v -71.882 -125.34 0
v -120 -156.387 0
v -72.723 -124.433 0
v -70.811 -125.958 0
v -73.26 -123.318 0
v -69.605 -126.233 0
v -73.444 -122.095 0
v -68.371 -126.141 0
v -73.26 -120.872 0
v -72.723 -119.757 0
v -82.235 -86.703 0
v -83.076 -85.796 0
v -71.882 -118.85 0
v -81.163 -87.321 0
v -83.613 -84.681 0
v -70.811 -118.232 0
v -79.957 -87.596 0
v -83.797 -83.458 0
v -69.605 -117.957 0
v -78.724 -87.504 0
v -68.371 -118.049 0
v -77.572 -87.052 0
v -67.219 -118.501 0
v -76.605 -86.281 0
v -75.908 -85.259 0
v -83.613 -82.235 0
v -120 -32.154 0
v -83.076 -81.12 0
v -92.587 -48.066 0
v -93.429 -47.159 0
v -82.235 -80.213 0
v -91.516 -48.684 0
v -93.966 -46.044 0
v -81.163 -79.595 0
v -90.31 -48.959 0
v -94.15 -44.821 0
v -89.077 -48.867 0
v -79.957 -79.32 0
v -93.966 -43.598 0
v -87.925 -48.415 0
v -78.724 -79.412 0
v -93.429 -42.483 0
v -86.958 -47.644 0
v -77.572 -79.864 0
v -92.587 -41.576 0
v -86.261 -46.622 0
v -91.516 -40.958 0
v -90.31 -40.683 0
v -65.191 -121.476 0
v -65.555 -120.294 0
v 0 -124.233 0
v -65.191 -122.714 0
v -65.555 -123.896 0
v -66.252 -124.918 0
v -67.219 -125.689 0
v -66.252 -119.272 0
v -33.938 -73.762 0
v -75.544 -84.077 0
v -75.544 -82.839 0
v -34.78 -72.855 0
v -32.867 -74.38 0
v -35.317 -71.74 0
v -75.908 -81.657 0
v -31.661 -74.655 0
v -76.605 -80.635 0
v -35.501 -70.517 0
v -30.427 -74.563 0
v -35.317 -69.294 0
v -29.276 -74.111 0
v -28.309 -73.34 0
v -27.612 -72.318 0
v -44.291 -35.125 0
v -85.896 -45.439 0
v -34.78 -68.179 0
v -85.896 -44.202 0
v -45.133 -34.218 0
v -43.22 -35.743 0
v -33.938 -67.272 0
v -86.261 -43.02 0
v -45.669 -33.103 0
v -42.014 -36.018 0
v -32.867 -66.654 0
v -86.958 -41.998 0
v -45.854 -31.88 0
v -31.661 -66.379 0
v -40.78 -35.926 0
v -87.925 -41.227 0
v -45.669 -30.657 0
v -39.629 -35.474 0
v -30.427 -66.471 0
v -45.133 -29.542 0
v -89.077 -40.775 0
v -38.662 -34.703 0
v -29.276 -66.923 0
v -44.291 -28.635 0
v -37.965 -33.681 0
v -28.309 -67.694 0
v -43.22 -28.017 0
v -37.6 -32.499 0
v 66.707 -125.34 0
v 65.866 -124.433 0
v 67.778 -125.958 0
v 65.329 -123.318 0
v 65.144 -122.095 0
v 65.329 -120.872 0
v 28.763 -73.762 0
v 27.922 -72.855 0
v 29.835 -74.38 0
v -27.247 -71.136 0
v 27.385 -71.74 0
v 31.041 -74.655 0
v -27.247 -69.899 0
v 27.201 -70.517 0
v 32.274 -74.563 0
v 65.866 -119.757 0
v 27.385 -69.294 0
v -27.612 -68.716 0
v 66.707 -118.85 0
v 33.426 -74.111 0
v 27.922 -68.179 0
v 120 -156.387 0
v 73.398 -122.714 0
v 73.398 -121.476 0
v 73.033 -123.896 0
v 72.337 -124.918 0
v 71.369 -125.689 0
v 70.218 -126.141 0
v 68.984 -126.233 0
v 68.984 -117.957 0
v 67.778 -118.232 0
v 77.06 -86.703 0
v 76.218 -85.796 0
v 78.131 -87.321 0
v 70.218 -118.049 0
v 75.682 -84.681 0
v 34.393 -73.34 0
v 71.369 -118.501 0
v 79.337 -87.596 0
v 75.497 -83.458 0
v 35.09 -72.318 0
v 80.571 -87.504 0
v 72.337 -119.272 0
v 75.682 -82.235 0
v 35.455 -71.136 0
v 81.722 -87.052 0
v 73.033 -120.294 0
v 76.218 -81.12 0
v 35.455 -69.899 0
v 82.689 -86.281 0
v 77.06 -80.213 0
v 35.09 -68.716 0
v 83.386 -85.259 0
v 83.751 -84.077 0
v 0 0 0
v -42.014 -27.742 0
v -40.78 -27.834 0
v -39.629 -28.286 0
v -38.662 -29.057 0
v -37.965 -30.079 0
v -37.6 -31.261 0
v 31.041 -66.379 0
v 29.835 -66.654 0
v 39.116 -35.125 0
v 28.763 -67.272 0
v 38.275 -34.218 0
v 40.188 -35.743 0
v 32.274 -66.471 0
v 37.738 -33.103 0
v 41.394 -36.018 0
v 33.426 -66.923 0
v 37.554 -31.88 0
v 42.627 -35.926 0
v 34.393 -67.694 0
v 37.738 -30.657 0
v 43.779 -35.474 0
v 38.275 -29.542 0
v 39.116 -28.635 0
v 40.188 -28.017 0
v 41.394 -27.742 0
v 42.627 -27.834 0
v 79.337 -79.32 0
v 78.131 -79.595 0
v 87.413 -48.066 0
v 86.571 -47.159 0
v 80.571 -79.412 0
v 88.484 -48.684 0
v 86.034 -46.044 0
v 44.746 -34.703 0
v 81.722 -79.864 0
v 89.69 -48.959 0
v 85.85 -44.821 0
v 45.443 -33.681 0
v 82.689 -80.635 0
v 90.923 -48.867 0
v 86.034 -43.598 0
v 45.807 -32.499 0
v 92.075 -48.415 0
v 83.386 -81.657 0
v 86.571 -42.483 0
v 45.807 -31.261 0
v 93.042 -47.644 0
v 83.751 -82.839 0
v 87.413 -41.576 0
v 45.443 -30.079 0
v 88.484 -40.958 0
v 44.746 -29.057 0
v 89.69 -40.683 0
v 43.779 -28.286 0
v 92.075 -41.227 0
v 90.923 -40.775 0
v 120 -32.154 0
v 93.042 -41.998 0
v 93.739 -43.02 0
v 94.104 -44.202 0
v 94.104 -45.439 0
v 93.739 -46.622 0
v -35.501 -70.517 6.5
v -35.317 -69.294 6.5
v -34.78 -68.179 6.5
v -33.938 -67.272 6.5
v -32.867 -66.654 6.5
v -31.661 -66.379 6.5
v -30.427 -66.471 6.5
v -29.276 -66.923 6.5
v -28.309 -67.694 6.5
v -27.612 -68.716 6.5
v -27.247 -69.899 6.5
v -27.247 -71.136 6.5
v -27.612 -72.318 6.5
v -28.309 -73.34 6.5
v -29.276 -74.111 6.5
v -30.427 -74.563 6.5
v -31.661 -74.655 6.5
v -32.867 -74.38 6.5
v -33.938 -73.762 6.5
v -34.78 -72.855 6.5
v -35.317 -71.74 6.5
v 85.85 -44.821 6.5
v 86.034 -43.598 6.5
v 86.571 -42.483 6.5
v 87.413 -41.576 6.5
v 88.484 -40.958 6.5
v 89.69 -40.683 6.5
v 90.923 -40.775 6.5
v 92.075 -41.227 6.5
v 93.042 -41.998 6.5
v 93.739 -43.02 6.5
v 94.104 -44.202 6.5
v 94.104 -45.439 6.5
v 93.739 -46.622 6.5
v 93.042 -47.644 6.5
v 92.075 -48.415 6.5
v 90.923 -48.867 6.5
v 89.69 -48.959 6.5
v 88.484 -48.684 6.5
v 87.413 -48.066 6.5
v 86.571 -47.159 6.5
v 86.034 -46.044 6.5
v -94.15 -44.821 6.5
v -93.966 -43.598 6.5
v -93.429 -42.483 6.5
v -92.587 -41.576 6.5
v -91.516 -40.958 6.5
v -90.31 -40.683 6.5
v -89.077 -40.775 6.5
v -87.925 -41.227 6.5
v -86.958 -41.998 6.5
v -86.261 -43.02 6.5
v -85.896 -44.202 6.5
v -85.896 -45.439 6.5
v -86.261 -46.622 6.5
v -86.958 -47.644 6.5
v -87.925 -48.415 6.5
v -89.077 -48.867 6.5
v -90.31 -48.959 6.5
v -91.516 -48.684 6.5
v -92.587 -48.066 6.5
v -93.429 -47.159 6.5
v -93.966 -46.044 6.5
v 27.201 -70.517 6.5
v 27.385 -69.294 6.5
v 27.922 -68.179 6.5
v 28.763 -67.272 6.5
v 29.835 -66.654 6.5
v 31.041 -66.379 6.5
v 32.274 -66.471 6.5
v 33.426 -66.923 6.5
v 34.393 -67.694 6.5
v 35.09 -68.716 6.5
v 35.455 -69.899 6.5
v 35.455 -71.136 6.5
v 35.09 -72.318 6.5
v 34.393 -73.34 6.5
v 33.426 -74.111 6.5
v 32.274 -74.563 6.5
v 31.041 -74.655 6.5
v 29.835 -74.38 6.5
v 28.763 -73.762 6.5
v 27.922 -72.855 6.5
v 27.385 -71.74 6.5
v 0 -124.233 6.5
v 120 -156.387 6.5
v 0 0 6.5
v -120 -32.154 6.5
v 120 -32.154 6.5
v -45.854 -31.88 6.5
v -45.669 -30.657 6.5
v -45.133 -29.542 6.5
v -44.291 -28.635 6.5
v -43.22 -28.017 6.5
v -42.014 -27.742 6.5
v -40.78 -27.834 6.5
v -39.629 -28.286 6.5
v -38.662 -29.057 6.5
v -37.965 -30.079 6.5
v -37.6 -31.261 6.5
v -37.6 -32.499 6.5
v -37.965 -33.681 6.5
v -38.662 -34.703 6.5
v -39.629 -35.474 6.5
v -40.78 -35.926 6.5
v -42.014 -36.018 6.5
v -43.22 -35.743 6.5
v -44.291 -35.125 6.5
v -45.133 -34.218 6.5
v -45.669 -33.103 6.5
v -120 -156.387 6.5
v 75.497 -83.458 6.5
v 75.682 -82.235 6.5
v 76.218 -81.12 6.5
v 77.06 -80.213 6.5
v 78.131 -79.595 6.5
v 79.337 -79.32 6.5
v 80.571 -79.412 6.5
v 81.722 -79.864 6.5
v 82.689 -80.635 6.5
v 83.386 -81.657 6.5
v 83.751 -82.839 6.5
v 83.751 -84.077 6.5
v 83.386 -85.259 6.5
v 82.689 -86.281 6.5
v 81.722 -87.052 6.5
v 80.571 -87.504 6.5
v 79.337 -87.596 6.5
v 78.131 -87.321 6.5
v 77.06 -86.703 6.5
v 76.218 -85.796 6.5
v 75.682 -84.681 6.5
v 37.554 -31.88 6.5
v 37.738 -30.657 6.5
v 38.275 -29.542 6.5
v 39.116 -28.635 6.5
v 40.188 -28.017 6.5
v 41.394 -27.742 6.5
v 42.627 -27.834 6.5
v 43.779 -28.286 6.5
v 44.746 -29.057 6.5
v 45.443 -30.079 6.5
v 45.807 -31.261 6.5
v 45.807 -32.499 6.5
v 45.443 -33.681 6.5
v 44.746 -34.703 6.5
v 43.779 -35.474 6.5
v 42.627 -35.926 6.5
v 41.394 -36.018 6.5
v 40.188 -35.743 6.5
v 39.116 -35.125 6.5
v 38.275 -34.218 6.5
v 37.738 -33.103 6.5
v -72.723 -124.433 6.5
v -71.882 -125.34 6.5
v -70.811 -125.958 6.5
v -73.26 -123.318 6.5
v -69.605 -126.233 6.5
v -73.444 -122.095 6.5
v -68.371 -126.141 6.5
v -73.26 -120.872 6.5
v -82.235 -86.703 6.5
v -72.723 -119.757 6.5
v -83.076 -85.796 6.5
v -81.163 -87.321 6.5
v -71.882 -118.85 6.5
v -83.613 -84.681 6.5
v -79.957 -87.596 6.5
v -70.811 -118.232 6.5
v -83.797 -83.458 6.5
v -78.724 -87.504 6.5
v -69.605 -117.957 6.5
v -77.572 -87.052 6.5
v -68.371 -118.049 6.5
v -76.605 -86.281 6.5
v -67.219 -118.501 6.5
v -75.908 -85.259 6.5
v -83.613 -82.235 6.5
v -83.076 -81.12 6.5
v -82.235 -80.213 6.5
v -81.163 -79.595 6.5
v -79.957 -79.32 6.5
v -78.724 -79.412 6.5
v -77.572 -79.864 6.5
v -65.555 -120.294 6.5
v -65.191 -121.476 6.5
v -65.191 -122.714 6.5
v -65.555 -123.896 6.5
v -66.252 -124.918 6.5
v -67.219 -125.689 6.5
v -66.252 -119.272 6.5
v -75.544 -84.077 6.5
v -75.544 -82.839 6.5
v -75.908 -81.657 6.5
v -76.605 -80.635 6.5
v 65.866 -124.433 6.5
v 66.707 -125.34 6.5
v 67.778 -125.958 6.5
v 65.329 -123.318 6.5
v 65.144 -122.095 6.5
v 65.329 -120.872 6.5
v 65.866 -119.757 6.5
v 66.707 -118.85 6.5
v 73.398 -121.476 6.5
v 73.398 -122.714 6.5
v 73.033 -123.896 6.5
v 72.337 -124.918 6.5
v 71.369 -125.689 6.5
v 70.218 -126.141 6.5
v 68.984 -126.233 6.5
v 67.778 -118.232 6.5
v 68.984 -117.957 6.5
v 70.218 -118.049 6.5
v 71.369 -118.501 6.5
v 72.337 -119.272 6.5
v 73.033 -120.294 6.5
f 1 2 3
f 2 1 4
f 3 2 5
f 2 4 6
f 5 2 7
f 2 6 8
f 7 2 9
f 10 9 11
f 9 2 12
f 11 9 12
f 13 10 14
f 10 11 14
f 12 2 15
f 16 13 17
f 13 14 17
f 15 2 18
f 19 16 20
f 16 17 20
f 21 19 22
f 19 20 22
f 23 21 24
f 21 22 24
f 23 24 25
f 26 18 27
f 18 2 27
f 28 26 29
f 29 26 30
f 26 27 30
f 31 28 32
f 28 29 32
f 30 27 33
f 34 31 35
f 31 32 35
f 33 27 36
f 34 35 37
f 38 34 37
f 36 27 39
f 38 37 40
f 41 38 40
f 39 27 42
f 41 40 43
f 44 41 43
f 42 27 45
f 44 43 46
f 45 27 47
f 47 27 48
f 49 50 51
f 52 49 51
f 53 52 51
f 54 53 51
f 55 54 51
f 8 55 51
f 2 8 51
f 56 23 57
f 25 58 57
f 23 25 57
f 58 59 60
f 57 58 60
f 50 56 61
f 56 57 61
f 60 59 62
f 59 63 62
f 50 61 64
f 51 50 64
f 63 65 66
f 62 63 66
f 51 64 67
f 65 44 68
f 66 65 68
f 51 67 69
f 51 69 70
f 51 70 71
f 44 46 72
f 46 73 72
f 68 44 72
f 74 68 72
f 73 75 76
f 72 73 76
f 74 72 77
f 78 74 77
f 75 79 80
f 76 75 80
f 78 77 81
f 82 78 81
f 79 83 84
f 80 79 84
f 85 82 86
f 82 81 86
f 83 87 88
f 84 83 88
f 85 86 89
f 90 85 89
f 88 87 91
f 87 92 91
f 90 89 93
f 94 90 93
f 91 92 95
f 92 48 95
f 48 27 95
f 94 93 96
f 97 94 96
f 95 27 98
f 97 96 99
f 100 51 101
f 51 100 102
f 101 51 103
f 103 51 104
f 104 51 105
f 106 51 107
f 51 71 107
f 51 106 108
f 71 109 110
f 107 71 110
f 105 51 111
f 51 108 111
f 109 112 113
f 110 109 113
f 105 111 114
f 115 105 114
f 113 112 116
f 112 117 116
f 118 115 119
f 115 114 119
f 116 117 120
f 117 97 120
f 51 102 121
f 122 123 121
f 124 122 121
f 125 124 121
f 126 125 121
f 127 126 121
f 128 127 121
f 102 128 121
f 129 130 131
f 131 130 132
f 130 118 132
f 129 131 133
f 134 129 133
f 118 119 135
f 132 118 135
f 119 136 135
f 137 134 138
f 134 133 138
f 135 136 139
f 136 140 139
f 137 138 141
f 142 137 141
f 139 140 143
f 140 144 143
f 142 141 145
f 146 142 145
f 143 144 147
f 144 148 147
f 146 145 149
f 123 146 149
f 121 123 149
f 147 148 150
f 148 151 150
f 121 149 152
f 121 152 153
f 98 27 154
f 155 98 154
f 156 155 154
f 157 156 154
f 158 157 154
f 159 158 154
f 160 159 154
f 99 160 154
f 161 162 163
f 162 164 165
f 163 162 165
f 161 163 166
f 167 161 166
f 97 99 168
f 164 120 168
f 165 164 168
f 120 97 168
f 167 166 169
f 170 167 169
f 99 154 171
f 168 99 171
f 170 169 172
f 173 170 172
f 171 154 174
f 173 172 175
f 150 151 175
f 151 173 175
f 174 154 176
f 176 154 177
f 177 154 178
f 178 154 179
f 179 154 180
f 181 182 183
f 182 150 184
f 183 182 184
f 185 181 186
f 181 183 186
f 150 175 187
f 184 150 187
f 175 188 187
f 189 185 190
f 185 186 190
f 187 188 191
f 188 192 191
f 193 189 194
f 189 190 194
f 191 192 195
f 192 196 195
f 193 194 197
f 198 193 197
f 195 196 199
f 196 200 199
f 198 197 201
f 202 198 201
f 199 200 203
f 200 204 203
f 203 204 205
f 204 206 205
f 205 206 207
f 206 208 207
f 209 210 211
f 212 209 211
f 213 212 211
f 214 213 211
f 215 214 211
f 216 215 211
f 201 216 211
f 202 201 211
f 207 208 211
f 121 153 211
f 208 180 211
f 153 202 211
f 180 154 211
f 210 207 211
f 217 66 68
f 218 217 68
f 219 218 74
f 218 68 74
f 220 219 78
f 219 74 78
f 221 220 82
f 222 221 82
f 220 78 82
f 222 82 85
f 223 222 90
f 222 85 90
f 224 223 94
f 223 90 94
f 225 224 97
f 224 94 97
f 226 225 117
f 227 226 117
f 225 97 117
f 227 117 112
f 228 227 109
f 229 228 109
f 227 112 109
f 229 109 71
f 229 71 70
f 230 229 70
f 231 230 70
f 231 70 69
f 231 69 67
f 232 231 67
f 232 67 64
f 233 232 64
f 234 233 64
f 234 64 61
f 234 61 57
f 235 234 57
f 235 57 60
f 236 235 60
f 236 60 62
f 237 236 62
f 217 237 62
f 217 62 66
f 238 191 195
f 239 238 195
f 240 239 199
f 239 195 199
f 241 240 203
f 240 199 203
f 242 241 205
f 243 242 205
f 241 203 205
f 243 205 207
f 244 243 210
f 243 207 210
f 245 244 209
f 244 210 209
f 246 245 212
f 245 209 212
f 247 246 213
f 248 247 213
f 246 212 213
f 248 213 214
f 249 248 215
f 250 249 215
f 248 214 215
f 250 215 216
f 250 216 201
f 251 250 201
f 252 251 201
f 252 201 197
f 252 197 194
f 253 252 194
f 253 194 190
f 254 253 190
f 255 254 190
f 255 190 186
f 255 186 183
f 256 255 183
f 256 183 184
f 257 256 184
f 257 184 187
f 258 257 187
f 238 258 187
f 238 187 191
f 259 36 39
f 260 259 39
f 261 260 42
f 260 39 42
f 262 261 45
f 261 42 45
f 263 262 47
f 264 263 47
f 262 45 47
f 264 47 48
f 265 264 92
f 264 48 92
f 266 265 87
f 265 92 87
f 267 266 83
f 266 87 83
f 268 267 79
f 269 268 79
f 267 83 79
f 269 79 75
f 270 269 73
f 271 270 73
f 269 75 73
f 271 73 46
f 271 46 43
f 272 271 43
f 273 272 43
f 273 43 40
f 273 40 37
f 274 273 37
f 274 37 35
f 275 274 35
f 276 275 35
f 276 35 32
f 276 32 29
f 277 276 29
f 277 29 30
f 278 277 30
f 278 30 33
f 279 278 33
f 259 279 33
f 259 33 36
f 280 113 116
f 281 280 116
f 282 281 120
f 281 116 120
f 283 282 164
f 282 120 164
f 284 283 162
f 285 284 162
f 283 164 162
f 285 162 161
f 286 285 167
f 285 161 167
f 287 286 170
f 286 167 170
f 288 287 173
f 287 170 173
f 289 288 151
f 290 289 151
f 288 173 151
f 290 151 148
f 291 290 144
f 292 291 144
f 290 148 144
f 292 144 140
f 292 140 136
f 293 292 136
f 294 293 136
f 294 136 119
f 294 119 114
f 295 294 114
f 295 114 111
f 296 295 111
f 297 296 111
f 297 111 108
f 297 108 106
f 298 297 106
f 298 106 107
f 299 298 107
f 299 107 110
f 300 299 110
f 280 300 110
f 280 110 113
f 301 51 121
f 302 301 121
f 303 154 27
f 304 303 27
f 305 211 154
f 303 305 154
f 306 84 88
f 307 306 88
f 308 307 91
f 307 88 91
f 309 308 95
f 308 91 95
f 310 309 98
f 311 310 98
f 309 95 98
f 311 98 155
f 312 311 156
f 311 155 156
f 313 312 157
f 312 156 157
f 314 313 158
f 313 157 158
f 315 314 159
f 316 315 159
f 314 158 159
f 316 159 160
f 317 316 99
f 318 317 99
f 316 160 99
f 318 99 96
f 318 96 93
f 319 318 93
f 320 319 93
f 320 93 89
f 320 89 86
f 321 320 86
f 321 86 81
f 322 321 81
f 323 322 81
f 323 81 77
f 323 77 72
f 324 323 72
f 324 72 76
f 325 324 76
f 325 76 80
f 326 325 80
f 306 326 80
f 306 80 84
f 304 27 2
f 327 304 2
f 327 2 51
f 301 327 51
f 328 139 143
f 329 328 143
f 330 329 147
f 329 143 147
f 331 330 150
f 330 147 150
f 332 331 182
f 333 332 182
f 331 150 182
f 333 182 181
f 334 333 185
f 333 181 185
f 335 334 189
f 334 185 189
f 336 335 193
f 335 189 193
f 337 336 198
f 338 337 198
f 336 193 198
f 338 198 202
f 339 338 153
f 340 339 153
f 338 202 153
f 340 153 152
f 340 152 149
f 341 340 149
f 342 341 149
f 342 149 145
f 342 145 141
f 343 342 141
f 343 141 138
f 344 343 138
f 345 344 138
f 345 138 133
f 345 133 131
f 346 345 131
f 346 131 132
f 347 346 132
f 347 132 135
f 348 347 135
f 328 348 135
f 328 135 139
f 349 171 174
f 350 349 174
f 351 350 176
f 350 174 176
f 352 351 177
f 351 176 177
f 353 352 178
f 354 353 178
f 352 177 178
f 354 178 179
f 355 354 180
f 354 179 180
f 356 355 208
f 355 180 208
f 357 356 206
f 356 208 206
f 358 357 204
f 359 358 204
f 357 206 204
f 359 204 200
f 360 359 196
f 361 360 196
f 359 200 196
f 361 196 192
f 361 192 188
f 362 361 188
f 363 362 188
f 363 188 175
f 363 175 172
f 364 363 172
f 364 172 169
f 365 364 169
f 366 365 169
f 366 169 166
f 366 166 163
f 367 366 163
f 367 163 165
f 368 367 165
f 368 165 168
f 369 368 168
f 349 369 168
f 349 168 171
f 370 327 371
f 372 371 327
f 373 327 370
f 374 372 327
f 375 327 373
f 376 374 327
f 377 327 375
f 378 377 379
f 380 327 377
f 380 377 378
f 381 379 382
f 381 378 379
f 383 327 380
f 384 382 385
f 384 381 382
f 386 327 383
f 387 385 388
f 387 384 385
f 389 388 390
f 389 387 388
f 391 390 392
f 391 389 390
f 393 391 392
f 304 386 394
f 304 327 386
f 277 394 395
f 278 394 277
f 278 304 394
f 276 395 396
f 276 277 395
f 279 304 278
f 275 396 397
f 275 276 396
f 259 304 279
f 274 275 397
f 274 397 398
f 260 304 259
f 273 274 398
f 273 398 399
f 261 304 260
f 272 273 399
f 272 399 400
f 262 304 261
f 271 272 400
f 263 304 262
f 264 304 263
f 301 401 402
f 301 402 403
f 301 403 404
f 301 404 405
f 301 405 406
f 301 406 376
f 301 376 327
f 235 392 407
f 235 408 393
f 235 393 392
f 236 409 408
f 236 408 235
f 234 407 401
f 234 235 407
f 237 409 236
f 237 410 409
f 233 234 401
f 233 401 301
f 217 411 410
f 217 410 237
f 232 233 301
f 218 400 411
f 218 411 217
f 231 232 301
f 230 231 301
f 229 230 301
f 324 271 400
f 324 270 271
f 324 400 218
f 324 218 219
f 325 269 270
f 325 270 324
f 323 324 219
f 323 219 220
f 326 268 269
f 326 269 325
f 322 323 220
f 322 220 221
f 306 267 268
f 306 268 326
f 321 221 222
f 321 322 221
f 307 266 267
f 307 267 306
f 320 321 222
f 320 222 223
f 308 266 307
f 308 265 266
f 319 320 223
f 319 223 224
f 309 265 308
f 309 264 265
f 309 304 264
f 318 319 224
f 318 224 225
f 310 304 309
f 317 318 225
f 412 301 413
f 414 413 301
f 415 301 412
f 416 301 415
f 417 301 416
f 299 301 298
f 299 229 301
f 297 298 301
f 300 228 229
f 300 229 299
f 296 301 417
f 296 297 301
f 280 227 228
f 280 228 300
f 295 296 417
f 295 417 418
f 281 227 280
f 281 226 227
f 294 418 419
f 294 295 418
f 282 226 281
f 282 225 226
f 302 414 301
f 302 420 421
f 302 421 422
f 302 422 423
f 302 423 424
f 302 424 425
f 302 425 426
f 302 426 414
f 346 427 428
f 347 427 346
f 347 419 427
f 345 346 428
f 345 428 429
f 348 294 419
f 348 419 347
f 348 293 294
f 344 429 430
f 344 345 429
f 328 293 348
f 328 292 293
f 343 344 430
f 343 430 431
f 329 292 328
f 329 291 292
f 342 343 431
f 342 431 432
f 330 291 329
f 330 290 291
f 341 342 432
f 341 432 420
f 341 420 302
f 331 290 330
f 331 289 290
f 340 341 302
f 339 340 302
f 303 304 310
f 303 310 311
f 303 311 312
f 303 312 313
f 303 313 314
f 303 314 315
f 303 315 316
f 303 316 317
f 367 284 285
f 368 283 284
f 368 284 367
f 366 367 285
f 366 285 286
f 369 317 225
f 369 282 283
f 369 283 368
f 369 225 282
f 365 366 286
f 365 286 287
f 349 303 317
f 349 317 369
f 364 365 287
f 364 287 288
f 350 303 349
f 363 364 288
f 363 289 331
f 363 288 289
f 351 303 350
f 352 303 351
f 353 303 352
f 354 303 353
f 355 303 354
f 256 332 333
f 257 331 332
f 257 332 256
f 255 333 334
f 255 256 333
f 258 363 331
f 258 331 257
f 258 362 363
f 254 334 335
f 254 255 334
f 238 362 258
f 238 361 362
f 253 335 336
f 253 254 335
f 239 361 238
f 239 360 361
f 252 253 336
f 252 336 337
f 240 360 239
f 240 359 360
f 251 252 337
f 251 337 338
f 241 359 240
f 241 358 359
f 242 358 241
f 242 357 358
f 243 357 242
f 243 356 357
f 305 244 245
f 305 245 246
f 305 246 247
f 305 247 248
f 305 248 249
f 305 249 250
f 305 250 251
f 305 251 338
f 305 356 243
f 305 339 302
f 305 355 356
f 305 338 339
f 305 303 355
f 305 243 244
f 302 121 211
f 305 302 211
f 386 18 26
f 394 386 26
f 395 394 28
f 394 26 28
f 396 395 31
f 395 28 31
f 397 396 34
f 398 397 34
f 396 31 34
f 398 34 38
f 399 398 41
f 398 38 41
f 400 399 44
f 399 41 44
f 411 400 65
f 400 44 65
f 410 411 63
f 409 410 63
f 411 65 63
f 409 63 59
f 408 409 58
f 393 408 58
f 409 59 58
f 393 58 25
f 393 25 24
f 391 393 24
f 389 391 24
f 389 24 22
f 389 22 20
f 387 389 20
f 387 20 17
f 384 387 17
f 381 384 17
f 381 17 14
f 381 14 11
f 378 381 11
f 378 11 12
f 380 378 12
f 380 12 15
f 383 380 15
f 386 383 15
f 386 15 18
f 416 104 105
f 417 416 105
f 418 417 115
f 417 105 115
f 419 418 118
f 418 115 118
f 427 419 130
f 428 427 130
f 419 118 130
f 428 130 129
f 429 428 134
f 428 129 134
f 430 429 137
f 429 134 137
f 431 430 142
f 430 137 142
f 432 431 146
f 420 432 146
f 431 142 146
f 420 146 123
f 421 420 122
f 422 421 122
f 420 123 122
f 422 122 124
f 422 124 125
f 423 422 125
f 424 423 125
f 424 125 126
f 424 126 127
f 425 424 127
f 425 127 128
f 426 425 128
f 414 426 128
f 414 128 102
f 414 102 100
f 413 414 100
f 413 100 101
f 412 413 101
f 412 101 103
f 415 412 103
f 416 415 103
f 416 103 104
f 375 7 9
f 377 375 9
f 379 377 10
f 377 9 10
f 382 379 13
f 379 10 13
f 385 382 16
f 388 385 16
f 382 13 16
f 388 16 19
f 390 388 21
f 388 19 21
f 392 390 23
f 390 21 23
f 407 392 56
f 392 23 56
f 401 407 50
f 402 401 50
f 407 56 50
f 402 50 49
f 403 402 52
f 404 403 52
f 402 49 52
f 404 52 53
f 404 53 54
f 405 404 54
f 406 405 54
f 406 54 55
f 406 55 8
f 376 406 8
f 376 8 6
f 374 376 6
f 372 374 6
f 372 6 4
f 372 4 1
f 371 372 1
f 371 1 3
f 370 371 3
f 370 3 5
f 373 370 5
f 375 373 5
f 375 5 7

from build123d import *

# Parameters (mm, degrees)
F1_DEPTH = 6.5
F3_D     = 8.3


with BuildPart() as f1:
    # F0 (on Top) → F1 (new body)
    with BuildSketch(Plane.XY):
        Polygon((120, -32.1539030917), (0, 0), (-120, -32.1539030917), (-120, -156.3870447409), (0, -124.2331416492), (120, -156.3870447409), align=None)
    extrude(amount=F1_DEPTH)

    # F3 (through all)
    with Locations(Plane.XY.offset(6.5)):
        with Locations((-90, -44.820950927), (-41.7037086855, -31.8799986719), (-79.6472381959, -83.4579839786), (-31.3509468814, -70.5170317234), (-69.2944763918, -122.0950170301), (41.7037086855, -31.8799986719), (90, -44.820950927), (79.6472381959, -83.4579839786), (69.2944763918, -122.0950170301), (31.3509468814, -70.5170317234)):
            Hole(F3_D / 2)


solid = f1.part
